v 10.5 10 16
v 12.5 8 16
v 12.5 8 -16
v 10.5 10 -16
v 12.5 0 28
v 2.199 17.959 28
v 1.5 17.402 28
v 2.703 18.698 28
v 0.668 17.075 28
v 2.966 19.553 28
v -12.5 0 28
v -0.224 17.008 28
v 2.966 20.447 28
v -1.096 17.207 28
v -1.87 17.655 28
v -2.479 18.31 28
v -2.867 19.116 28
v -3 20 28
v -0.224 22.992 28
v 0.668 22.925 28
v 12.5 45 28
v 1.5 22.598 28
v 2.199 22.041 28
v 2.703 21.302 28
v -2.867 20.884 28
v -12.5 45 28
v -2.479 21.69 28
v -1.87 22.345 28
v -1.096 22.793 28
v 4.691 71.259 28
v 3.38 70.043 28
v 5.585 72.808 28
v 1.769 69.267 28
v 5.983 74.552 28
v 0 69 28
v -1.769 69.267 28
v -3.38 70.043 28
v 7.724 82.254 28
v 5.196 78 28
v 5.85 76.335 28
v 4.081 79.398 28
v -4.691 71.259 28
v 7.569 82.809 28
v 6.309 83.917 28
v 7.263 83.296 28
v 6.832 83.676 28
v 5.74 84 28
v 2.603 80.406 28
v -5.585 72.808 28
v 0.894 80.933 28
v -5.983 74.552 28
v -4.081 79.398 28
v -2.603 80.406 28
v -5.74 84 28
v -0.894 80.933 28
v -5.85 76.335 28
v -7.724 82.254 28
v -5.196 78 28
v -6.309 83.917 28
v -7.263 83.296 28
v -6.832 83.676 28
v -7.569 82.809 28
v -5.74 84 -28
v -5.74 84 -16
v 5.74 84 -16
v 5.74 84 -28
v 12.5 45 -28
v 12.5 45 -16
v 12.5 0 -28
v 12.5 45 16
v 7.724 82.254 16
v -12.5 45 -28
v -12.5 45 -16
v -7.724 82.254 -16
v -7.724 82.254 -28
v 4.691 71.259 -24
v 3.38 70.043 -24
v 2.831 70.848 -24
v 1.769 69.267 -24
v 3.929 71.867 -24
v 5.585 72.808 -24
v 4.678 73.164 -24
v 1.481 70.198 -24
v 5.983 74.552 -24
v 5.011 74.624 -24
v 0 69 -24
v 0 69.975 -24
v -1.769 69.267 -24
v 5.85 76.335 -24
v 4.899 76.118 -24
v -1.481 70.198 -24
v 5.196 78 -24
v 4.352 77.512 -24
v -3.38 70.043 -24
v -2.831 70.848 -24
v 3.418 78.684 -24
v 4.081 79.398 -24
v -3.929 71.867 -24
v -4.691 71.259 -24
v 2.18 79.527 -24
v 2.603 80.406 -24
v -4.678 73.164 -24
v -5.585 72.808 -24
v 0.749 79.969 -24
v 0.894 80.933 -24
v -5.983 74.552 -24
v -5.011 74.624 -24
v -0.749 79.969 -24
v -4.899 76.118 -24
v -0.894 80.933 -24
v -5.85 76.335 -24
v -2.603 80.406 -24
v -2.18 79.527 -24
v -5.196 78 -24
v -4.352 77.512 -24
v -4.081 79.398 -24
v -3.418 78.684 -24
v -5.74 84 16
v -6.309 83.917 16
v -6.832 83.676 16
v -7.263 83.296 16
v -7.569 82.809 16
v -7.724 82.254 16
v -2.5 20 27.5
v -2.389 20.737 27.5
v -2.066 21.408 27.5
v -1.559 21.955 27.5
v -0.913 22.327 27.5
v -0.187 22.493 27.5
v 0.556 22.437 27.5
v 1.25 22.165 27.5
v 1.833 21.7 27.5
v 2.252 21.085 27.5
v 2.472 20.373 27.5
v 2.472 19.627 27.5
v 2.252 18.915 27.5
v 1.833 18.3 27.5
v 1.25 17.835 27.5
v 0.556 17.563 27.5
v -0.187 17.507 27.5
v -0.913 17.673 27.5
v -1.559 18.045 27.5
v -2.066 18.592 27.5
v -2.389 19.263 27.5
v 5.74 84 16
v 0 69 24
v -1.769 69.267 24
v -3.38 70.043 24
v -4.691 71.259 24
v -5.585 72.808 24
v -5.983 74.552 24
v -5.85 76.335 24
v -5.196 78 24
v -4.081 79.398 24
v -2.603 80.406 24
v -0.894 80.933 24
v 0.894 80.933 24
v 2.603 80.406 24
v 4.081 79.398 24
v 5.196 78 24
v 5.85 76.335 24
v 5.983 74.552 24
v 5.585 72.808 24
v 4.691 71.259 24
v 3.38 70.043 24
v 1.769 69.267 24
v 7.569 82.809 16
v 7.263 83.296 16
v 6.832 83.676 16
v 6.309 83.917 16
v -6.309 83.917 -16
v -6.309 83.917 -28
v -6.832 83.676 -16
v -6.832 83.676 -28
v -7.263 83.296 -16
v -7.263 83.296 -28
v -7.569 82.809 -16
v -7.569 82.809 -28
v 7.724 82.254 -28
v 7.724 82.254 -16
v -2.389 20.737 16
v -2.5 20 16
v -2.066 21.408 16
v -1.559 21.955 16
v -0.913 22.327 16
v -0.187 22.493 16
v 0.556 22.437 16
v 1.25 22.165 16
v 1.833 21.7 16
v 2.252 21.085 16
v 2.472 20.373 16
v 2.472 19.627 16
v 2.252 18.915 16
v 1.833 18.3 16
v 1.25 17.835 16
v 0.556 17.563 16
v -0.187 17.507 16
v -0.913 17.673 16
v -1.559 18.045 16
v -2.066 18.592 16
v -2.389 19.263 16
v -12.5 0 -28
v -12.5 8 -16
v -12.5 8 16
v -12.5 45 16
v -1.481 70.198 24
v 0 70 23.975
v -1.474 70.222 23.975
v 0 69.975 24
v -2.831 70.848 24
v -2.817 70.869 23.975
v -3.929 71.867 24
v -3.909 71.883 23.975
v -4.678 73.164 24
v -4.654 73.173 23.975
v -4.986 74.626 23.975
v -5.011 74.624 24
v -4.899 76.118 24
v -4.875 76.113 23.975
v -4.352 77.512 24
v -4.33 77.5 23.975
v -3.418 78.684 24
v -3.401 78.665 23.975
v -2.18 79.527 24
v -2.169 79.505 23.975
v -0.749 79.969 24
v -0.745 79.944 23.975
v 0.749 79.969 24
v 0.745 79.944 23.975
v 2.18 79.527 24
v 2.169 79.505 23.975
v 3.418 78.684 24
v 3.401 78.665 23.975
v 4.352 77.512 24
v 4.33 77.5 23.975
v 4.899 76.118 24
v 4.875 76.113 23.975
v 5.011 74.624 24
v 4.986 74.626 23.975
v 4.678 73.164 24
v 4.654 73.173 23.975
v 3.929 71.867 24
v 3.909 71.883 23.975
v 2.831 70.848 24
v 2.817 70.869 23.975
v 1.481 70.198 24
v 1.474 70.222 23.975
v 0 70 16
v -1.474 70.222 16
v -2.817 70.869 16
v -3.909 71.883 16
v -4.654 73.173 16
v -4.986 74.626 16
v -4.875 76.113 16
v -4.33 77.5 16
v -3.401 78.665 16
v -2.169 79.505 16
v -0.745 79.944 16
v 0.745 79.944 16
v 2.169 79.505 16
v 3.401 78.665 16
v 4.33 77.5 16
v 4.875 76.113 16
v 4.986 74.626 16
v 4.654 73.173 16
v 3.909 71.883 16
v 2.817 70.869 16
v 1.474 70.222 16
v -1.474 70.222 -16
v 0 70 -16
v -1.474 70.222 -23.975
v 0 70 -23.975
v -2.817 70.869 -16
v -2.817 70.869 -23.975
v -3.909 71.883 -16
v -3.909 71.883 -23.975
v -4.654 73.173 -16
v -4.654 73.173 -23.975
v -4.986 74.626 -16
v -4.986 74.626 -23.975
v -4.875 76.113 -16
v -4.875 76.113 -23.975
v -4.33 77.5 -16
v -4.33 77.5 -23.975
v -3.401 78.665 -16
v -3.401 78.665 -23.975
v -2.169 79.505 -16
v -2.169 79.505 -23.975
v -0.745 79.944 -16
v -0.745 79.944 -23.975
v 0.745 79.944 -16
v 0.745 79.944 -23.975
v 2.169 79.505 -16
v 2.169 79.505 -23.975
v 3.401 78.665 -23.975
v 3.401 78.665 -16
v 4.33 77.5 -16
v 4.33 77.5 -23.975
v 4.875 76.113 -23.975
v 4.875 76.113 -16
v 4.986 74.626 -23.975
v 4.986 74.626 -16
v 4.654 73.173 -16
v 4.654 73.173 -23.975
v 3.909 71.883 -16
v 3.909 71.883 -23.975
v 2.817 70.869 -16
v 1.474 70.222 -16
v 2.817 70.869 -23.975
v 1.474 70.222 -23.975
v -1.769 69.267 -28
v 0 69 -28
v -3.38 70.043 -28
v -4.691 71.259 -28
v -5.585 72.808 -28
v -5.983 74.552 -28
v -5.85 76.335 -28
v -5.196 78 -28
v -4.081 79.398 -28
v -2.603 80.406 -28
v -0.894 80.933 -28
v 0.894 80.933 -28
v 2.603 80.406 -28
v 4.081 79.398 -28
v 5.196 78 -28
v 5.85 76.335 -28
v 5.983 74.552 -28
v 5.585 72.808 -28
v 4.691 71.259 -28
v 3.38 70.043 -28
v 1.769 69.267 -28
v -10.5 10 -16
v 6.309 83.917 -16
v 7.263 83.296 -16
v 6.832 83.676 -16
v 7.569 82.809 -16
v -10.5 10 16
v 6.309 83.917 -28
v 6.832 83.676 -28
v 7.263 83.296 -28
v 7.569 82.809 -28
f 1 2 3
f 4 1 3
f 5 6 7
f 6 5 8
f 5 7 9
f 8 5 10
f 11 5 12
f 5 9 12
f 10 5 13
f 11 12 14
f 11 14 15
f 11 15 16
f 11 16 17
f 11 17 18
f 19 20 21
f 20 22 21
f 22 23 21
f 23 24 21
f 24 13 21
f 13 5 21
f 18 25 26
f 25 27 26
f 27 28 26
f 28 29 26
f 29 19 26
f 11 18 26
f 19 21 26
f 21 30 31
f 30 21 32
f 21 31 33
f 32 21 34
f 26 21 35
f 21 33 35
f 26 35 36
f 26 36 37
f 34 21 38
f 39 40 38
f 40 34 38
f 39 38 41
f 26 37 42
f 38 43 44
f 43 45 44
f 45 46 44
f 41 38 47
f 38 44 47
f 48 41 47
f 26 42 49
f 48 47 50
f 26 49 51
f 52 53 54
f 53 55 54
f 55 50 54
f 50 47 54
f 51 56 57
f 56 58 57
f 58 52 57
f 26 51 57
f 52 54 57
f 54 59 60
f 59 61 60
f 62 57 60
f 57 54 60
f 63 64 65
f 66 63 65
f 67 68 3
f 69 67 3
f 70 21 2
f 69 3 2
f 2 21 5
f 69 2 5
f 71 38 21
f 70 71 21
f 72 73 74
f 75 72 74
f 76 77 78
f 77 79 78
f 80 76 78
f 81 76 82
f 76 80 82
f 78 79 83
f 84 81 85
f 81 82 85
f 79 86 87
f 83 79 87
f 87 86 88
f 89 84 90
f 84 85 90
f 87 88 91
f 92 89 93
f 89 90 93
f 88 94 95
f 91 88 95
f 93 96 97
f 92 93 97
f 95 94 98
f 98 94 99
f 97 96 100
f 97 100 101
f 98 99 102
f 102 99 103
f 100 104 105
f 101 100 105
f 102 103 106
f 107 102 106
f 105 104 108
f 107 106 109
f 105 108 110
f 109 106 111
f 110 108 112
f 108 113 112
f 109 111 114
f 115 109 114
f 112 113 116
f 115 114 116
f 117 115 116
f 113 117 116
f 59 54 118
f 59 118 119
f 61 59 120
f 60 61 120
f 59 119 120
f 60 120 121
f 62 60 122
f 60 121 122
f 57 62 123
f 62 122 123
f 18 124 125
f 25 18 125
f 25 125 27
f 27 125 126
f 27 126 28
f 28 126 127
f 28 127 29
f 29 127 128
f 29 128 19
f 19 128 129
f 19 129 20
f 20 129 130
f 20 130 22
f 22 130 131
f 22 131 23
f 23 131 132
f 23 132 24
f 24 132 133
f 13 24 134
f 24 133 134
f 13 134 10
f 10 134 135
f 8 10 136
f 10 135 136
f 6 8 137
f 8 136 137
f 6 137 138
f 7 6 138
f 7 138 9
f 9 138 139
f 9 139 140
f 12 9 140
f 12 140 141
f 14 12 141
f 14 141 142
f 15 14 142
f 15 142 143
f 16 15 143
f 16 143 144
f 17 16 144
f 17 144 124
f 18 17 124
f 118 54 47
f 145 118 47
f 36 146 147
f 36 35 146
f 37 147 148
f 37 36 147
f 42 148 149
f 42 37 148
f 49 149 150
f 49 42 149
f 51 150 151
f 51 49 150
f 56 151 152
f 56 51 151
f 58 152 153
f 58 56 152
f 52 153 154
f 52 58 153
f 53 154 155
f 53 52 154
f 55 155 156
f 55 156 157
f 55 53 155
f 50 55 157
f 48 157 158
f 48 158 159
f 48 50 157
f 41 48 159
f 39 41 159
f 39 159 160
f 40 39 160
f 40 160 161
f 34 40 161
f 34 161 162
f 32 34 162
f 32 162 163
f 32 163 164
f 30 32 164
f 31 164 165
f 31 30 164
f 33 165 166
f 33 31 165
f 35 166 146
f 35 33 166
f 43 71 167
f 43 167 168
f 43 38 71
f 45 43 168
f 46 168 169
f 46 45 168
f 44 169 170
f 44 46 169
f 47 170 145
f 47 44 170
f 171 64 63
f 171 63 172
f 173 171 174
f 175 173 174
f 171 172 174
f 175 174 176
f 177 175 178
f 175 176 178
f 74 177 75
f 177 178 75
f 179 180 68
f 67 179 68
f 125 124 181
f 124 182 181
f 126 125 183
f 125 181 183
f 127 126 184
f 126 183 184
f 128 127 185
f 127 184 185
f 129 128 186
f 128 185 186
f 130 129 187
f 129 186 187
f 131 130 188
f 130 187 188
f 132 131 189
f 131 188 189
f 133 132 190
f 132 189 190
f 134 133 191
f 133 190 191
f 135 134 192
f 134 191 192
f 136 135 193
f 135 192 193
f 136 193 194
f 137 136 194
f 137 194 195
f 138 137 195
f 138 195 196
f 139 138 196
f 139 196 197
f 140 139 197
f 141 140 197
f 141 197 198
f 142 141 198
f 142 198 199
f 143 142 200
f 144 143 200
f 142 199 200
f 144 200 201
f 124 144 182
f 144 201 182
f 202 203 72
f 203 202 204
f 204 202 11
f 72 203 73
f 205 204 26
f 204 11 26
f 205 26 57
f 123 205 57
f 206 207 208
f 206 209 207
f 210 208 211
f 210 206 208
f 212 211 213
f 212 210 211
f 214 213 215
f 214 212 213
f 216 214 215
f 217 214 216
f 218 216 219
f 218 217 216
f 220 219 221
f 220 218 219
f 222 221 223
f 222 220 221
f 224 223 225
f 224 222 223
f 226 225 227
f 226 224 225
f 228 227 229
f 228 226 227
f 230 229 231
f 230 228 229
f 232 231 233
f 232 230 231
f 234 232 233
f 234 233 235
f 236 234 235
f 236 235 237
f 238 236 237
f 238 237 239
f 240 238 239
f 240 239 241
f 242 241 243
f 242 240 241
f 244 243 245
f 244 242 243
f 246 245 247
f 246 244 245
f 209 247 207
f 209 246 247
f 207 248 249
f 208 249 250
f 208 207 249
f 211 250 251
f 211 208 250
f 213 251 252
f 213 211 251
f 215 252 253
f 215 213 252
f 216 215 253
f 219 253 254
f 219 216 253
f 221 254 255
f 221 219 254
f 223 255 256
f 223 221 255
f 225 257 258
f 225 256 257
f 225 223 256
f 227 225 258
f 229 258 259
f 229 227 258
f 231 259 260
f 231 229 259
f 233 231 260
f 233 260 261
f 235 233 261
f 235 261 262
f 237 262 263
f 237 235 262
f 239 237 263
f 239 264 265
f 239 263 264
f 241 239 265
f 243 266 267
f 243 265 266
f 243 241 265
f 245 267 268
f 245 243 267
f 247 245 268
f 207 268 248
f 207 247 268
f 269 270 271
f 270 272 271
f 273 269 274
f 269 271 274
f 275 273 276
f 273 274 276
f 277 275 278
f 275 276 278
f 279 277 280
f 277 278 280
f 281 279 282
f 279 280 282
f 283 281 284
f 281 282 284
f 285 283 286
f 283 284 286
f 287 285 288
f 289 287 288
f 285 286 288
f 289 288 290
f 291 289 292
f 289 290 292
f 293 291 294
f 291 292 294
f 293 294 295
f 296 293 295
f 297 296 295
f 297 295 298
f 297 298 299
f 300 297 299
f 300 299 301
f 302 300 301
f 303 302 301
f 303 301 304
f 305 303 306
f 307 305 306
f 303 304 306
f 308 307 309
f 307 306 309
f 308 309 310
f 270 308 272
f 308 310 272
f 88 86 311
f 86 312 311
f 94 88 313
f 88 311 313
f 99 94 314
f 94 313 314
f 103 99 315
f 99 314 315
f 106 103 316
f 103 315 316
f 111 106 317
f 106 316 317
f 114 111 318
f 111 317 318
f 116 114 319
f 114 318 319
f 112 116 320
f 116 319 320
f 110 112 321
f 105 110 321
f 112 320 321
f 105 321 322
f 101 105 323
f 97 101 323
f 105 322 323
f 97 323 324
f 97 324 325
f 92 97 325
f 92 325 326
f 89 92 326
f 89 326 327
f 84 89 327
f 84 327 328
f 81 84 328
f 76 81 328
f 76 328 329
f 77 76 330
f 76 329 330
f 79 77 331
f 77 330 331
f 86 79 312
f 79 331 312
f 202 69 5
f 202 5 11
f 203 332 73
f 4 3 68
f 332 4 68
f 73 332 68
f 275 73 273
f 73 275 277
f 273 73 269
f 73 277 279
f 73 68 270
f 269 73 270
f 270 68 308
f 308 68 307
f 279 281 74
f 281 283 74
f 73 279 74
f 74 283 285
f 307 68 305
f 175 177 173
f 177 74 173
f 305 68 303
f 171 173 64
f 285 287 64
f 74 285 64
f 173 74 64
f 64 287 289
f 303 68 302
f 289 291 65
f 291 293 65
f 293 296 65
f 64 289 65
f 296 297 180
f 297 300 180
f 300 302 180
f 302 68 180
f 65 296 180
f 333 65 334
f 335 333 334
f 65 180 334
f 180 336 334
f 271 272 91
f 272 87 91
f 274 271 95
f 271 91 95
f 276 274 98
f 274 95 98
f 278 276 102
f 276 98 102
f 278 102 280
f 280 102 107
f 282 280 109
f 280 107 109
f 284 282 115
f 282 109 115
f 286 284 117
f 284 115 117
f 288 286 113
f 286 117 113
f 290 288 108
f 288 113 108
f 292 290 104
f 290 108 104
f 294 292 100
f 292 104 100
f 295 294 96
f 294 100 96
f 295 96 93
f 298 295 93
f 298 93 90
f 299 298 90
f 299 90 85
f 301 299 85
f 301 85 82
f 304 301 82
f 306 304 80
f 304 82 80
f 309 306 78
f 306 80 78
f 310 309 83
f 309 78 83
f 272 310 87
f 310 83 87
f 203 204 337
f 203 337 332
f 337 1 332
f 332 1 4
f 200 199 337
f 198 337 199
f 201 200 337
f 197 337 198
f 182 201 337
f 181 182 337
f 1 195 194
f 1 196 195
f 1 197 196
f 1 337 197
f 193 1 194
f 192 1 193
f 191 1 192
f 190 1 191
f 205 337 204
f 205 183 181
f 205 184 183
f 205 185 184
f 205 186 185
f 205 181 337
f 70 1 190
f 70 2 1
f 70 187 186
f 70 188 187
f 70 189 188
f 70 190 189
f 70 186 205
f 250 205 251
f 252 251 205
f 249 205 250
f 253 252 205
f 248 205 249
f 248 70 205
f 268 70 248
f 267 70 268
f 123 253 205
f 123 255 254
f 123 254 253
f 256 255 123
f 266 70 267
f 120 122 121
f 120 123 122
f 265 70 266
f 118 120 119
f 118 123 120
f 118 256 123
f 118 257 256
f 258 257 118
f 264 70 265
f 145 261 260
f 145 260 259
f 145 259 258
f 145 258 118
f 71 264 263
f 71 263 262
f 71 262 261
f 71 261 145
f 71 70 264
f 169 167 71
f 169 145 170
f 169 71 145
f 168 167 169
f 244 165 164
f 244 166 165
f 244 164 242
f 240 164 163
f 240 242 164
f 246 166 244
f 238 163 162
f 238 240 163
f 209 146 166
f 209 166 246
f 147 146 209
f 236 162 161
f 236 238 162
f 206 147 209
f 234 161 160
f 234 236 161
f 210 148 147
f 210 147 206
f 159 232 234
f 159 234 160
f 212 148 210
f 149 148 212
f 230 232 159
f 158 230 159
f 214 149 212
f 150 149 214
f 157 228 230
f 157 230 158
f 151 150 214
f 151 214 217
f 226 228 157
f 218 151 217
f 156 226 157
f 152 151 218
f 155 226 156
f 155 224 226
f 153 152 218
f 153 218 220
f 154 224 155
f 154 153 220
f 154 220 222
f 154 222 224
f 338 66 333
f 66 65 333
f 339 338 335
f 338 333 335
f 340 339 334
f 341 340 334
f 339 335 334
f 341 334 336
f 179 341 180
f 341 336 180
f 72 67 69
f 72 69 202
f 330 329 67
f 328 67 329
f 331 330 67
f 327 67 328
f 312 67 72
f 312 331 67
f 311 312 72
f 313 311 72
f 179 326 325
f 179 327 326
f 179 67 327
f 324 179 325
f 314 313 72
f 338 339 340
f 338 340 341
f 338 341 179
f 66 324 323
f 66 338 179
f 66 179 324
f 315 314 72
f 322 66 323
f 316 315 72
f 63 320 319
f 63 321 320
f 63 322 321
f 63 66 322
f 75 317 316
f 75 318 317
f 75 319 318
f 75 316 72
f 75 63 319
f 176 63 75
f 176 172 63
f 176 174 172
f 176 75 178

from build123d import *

# Parameters (mm, degrees)
BOSS_EXTRUDE3_DEPTH         = 28
SKETCH4_W                   = 32
SKETCH4_H                   = 74
CUT_EXTRUDE2_DEPTH          = 26
M6_TAPPED_HOLE1_D           = 5
M6_TAPPED_HOLE1_DEPTH       = 27
M6_TAPPED_HOLE1_CSINK_D     = 6
M6_TAPPED_HOLE1_CSINK_ANGLE = 90
M6_TAPPED_HOLE1_TIP         = 1.502151548
CHAMFER1_SIZE               = 2
FILLET2_R                   = 2


with BuildPart() as part:
    # Sketch3 → Boss-Extrude3 (new body, symmetric)
    with BuildSketch(Plane.XY):
        Polygon((12.5, 0), (-12.5, 0), (-12.5, 45), (-7.5, 84), (7.5, 84), (12.5, 45), align=None)
    extrude(amount=BOSS_EXTRUDE3_DEPTH, both=True)

    # Sketch4 → Cut-Extrude2 (cut, through all)
    with BuildSketch(Plane(origin=(12.5, 0, 0), x_dir=(0, 0, -1), z_dir=(1, 0, 0))):
        with Locations((0, 47)):
            Rectangle(SKETCH4_W, SKETCH4_H)
    extrude(amount=-CUT_EXTRUDE2_DEPTH, mode=Mode.SUBTRACT)

    # Sketch7 → CBORE for M4 Hex Socket Head Cap Screw1 (revolve, cut)
    with BuildSketch(Plane(origin=(0, 75, 28), x_dir=(0, -1, 0), z_dir=(1, 0, 0))):
        Polygon((0, 0), (0, 23.004303095), (5, 20), (5, 4.025), (5.025, 4), (6, 4), (6, 0), align=None)
    cbore_for_m4_hex_socket_head_cap_screw1 = revolve(axis=Axis((0, 75, 34.35), (0, 0, -1)), mode=Mode.SUBTRACT)

    # Mirror1: CBORE for M4 Hex Socket Head Cap Screw1 across plane
    add(cbore_for_m4_hex_socket_head_cap_screw1.mirror(Plane.XY), mode=Mode.SUBTRACT)

    # M6 Tapped Hole1
    with Locations(Plane.XY.offset(28)):
        with Locations((0, 20)):
            CounterSinkHole(M6_TAPPED_HOLE1_D / 2, M6_TAPPED_HOLE1_CSINK_D / 2, depth=M6_TAPPED_HOLE1_DEPTH, counter_sink_angle=M6_TAPPED_HOLE1_CSINK_ANGLE)
            with Locations((0, 0, -(M6_TAPPED_HOLE1_DEPTH + M6_TAPPED_HOLE1_TIP / 2))):  # 118° drill point
                Cone(0, M6_TAPPED_HOLE1_D / 2, M6_TAPPED_HOLE1_TIP, mode=Mode.SUBTRACT)

    # Chamfer1
    chamfer1_edges = [part.edges().sort_by_distance(p)[0] for p in [
        (12.5, 10, 0),
        (-12.5, 10, 0),
    ]]
    chamfer(chamfer1_edges, length=CHAMFER1_SIZE)

    # Fillet2
    fillet2_edges = [part.edges().sort_by_distance(p)[0] for p in [
        (-7.5, 84, 22),
        (7.5, 84, 22),
        (-7.5, 84, -22),
        (7.5, 84, -22),
    ]]
    fillet(fillet2_edges, radius=FILLET2_R)


solid = part.part
